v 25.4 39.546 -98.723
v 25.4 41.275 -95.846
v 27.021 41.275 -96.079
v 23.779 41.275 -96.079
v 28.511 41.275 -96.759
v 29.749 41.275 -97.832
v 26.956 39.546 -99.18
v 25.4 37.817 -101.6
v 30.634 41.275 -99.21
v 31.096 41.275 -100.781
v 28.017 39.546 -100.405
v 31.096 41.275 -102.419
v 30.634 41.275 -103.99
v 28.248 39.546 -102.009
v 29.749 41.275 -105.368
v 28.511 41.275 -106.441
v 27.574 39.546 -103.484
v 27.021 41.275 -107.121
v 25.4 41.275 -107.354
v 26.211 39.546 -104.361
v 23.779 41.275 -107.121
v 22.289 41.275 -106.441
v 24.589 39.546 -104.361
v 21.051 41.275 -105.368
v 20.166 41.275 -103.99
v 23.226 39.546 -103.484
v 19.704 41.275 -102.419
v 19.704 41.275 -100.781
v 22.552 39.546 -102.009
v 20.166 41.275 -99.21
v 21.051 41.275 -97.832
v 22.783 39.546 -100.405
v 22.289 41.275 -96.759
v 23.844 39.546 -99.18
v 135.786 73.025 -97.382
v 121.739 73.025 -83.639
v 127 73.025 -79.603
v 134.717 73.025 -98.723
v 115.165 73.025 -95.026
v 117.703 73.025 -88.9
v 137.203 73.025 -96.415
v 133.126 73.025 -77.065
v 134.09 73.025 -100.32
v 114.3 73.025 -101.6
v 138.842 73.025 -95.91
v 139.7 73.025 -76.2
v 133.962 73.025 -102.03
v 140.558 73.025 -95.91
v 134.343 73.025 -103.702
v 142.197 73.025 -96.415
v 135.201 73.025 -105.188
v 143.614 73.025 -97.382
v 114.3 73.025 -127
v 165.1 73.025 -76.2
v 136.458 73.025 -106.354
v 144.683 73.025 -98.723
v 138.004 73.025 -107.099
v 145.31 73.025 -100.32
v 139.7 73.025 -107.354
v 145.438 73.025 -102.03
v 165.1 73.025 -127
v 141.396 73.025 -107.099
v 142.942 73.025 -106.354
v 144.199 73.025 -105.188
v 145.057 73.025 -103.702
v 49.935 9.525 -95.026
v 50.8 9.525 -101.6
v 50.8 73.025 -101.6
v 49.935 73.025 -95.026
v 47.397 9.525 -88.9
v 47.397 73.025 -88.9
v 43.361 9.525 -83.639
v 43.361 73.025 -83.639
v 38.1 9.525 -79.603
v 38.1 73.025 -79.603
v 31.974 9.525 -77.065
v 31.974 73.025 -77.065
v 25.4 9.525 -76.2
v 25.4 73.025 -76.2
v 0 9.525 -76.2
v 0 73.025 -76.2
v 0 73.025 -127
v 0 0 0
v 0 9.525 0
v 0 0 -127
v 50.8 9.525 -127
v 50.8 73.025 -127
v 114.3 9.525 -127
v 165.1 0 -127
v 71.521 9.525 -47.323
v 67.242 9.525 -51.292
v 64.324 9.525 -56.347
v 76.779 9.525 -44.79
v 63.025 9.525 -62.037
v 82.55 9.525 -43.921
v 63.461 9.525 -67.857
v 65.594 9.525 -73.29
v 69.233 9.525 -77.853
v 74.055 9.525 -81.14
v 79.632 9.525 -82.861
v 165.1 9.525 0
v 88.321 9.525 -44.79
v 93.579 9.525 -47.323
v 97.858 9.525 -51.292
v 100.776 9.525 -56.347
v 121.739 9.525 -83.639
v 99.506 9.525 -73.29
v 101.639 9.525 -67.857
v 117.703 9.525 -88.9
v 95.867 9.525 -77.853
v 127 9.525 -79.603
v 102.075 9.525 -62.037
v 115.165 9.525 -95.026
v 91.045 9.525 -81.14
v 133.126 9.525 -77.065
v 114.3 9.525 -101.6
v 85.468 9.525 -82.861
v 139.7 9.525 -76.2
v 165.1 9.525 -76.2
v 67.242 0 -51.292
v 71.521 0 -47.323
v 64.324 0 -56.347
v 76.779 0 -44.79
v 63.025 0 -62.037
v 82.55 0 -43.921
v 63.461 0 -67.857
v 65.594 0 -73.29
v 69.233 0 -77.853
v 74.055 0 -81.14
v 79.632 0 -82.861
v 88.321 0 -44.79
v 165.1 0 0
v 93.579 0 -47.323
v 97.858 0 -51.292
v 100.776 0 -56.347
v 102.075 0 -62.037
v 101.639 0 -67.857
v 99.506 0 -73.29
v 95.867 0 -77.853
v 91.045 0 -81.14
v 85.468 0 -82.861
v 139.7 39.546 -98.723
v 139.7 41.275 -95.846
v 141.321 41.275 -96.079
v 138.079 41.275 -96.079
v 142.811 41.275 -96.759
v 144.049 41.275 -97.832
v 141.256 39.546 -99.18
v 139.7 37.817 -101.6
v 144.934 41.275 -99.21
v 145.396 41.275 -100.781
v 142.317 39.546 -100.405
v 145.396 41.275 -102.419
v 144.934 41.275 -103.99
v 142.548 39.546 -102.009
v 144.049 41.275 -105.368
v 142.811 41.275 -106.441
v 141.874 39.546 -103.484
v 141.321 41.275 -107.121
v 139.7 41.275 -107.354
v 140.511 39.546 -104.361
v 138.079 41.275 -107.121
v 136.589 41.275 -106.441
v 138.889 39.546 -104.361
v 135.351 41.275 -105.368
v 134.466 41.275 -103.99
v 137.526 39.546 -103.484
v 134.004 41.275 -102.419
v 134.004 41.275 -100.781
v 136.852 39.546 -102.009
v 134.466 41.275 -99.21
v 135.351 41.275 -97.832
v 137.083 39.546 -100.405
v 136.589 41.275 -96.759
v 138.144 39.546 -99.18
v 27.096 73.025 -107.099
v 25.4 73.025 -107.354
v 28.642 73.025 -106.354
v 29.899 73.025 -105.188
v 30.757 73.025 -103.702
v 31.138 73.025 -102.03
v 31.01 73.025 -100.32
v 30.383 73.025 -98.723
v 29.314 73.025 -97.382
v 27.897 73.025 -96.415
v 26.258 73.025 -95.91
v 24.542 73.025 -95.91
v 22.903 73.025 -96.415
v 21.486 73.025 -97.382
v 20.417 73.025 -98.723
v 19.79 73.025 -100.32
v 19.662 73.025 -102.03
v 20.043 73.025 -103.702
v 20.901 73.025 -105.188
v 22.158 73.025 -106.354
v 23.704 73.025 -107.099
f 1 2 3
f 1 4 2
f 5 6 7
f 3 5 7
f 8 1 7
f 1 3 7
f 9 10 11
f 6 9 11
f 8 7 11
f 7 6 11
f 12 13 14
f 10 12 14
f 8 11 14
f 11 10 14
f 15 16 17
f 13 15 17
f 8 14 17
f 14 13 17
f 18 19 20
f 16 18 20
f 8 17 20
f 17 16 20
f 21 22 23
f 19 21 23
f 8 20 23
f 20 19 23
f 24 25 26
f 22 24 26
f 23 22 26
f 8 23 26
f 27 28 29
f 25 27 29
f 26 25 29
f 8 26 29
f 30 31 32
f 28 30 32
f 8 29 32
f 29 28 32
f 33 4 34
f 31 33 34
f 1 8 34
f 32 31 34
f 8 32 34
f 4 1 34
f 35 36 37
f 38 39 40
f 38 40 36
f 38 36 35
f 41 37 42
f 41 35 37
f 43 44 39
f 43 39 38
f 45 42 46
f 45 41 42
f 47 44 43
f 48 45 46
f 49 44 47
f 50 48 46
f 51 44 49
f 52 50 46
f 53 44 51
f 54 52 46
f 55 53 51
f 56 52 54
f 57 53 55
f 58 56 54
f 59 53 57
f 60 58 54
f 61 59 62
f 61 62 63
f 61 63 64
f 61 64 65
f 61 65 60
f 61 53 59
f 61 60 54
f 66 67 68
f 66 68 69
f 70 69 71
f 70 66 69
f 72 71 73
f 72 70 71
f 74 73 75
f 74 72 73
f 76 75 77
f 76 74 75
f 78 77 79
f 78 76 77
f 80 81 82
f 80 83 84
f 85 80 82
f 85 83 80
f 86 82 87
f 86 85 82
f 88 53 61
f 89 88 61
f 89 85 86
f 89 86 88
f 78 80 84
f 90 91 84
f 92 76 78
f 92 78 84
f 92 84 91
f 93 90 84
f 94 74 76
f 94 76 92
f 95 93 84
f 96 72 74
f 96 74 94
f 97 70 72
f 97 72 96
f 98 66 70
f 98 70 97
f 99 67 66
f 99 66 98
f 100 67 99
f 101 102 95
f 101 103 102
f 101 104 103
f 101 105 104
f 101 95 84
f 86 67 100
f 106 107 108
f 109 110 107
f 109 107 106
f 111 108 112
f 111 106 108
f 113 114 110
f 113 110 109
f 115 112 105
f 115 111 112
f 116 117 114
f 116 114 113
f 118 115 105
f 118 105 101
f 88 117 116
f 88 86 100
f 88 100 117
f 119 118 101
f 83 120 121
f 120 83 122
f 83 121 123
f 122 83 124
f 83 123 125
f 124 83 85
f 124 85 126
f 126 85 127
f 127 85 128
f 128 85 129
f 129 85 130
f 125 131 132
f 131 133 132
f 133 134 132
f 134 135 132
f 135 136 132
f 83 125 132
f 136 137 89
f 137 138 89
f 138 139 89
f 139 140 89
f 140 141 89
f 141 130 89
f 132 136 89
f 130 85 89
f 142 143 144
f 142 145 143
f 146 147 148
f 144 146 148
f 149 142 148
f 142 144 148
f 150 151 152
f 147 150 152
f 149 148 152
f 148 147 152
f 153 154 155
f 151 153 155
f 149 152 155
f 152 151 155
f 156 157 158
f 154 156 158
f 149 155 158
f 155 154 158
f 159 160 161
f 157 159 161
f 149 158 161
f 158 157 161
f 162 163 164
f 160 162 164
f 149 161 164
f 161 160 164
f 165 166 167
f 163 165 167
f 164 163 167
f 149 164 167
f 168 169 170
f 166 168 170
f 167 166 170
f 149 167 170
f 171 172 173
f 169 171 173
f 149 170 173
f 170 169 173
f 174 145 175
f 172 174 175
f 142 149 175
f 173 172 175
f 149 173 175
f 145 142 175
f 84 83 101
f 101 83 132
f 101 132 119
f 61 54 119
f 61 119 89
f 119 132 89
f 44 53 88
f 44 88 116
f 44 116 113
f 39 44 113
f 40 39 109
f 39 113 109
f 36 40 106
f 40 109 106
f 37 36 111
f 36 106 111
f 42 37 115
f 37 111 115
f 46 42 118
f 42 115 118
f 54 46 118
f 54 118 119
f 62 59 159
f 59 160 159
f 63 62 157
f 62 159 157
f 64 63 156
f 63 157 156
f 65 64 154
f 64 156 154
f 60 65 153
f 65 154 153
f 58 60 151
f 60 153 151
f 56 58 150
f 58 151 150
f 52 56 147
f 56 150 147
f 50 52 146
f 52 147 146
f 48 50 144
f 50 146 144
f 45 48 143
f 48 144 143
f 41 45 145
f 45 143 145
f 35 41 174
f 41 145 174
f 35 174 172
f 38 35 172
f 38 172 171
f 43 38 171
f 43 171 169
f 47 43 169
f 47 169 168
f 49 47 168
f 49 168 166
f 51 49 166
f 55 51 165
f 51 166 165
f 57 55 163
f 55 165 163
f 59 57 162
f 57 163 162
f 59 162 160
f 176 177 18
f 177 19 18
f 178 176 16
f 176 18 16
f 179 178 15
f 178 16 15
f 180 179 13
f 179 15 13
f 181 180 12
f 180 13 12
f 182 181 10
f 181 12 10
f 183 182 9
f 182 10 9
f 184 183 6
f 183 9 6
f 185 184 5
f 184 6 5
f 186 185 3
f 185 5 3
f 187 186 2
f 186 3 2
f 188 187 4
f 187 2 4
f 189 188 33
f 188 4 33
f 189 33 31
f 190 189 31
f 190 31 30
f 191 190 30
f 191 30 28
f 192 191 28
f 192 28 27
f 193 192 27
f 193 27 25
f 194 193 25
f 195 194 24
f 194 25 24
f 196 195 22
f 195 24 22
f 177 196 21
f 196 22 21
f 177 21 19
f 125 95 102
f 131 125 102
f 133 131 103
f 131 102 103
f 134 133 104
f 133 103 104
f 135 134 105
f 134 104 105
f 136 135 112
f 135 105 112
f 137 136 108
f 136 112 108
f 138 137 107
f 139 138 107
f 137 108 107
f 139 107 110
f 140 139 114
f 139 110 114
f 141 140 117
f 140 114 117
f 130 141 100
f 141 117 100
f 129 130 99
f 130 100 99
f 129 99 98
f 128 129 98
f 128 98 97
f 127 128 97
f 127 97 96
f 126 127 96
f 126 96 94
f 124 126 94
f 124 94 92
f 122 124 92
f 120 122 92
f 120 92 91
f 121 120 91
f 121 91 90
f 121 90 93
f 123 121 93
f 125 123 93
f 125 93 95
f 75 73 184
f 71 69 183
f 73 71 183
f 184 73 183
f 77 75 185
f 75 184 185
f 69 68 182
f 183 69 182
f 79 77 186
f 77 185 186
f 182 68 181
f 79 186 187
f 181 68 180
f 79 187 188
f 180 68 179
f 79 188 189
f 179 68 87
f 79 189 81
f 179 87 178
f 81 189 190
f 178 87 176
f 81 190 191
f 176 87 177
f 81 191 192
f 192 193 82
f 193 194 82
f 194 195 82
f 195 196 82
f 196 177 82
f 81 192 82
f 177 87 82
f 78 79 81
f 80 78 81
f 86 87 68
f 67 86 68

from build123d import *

# Parameters (mm, degrees)
SKETCH1_W                   = 165.1
SKETCH1_H                   = 127
BOSS_EXTRUDE1_DEPTH         = 9.525
SKETCH2_R                   = 19.579444904
CUT_EXTRUDE1_DEPTH          = 209.513154561
BOSS_EXTRUDE3_DEPTH         = 63.5
F_1_2_20_TAPPED_HOLE1_D     = 11.50874
F_1_2_20_TAPPED_HOLE1_DEPTH = 31.75
F_1_2_20_TAPPED_HOLE1_TIP   = 3.45757432


with BuildPart() as part:
    # Sketch1 → Boss-Extrude1 (new body)
    with BuildSketch(Plane(origin=(0, 0, 0), x_dir=(1, 0, 0), z_dir=(0, 1, 0))):
        with Locations((82.55, 63.5)):
            Rectangle(SKETCH1_W, SKETCH1_H)
    extrude(amount=BOSS_EXTRUDE1_DEPTH)

    # Sketch2 → Cut-Extrude1 (cut, through all)
    with BuildSketch(Plane(origin=(0, 9.525, 0), x_dir=(1, 0, 0), z_dir=(0, 1, 0))):
        with Locations(Location((82.55, 63.5, 0), (0, 0, 270))):
            Circle(SKETCH2_R)
    extrude(amount=-CUT_EXTRUDE1_DEPTH, mode=Mode.SUBTRACT)

    # Sketch3 → Boss-Extrude3 (add)
    with BuildSketch(Plane(origin=(0, 9.525, 0), x_dir=(1, 0, 0), z_dir=(0, 1, 0))):
        with BuildLine():
            Line((0, 127), (50.8, 127))
            Line((50.8, 127), (50.8, 101.6))
            ThreePointArc((50.8, 101.6), (43.360512242, 83.639487758), (25.4, 76.2))
            Line((25.4, 76.2), (0, 76.2))
            Line((0, 76.2), (0, 127))
        make_face()
        with BuildLine():
            Line((165.1, 127), (114.3, 127))
            Line((114.3, 127), (114.3, 101.6))
            ThreePointArc((114.3, 101.6), (121.739487758, 83.639487758), (139.7, 76.2))
            Line((139.7, 76.2), (165.1, 76.2))
            Line((165.1, 76.2), (165.1, 127))
        make_face()
    extrude(amount=BOSS_EXTRUDE3_DEPTH)

    # 1/2-20 Tapped Hole1
    with Locations(Plane(origin=(25.4, 73.025, -101.6), x_dir=(0, 0, 1), z_dir=(0, 1, 0))):
        with Locations((0, 0), (0, 114.3)):
            Hole(F_1_2_20_TAPPED_HOLE1_D / 2, depth=F_1_2_20_TAPPED_HOLE1_DEPTH)
            with Locations((0, 0, -(F_1_2_20_TAPPED_HOLE1_DEPTH + F_1_2_20_TAPPED_HOLE1_TIP / 2))):  # 118° drill point
                Cone(0, F_1_2_20_TAPPED_HOLE1_D / 2, F_1_2_20_TAPPED_HOLE1_TIP, mode=Mode.SUBTRACT)


solid = part.part
